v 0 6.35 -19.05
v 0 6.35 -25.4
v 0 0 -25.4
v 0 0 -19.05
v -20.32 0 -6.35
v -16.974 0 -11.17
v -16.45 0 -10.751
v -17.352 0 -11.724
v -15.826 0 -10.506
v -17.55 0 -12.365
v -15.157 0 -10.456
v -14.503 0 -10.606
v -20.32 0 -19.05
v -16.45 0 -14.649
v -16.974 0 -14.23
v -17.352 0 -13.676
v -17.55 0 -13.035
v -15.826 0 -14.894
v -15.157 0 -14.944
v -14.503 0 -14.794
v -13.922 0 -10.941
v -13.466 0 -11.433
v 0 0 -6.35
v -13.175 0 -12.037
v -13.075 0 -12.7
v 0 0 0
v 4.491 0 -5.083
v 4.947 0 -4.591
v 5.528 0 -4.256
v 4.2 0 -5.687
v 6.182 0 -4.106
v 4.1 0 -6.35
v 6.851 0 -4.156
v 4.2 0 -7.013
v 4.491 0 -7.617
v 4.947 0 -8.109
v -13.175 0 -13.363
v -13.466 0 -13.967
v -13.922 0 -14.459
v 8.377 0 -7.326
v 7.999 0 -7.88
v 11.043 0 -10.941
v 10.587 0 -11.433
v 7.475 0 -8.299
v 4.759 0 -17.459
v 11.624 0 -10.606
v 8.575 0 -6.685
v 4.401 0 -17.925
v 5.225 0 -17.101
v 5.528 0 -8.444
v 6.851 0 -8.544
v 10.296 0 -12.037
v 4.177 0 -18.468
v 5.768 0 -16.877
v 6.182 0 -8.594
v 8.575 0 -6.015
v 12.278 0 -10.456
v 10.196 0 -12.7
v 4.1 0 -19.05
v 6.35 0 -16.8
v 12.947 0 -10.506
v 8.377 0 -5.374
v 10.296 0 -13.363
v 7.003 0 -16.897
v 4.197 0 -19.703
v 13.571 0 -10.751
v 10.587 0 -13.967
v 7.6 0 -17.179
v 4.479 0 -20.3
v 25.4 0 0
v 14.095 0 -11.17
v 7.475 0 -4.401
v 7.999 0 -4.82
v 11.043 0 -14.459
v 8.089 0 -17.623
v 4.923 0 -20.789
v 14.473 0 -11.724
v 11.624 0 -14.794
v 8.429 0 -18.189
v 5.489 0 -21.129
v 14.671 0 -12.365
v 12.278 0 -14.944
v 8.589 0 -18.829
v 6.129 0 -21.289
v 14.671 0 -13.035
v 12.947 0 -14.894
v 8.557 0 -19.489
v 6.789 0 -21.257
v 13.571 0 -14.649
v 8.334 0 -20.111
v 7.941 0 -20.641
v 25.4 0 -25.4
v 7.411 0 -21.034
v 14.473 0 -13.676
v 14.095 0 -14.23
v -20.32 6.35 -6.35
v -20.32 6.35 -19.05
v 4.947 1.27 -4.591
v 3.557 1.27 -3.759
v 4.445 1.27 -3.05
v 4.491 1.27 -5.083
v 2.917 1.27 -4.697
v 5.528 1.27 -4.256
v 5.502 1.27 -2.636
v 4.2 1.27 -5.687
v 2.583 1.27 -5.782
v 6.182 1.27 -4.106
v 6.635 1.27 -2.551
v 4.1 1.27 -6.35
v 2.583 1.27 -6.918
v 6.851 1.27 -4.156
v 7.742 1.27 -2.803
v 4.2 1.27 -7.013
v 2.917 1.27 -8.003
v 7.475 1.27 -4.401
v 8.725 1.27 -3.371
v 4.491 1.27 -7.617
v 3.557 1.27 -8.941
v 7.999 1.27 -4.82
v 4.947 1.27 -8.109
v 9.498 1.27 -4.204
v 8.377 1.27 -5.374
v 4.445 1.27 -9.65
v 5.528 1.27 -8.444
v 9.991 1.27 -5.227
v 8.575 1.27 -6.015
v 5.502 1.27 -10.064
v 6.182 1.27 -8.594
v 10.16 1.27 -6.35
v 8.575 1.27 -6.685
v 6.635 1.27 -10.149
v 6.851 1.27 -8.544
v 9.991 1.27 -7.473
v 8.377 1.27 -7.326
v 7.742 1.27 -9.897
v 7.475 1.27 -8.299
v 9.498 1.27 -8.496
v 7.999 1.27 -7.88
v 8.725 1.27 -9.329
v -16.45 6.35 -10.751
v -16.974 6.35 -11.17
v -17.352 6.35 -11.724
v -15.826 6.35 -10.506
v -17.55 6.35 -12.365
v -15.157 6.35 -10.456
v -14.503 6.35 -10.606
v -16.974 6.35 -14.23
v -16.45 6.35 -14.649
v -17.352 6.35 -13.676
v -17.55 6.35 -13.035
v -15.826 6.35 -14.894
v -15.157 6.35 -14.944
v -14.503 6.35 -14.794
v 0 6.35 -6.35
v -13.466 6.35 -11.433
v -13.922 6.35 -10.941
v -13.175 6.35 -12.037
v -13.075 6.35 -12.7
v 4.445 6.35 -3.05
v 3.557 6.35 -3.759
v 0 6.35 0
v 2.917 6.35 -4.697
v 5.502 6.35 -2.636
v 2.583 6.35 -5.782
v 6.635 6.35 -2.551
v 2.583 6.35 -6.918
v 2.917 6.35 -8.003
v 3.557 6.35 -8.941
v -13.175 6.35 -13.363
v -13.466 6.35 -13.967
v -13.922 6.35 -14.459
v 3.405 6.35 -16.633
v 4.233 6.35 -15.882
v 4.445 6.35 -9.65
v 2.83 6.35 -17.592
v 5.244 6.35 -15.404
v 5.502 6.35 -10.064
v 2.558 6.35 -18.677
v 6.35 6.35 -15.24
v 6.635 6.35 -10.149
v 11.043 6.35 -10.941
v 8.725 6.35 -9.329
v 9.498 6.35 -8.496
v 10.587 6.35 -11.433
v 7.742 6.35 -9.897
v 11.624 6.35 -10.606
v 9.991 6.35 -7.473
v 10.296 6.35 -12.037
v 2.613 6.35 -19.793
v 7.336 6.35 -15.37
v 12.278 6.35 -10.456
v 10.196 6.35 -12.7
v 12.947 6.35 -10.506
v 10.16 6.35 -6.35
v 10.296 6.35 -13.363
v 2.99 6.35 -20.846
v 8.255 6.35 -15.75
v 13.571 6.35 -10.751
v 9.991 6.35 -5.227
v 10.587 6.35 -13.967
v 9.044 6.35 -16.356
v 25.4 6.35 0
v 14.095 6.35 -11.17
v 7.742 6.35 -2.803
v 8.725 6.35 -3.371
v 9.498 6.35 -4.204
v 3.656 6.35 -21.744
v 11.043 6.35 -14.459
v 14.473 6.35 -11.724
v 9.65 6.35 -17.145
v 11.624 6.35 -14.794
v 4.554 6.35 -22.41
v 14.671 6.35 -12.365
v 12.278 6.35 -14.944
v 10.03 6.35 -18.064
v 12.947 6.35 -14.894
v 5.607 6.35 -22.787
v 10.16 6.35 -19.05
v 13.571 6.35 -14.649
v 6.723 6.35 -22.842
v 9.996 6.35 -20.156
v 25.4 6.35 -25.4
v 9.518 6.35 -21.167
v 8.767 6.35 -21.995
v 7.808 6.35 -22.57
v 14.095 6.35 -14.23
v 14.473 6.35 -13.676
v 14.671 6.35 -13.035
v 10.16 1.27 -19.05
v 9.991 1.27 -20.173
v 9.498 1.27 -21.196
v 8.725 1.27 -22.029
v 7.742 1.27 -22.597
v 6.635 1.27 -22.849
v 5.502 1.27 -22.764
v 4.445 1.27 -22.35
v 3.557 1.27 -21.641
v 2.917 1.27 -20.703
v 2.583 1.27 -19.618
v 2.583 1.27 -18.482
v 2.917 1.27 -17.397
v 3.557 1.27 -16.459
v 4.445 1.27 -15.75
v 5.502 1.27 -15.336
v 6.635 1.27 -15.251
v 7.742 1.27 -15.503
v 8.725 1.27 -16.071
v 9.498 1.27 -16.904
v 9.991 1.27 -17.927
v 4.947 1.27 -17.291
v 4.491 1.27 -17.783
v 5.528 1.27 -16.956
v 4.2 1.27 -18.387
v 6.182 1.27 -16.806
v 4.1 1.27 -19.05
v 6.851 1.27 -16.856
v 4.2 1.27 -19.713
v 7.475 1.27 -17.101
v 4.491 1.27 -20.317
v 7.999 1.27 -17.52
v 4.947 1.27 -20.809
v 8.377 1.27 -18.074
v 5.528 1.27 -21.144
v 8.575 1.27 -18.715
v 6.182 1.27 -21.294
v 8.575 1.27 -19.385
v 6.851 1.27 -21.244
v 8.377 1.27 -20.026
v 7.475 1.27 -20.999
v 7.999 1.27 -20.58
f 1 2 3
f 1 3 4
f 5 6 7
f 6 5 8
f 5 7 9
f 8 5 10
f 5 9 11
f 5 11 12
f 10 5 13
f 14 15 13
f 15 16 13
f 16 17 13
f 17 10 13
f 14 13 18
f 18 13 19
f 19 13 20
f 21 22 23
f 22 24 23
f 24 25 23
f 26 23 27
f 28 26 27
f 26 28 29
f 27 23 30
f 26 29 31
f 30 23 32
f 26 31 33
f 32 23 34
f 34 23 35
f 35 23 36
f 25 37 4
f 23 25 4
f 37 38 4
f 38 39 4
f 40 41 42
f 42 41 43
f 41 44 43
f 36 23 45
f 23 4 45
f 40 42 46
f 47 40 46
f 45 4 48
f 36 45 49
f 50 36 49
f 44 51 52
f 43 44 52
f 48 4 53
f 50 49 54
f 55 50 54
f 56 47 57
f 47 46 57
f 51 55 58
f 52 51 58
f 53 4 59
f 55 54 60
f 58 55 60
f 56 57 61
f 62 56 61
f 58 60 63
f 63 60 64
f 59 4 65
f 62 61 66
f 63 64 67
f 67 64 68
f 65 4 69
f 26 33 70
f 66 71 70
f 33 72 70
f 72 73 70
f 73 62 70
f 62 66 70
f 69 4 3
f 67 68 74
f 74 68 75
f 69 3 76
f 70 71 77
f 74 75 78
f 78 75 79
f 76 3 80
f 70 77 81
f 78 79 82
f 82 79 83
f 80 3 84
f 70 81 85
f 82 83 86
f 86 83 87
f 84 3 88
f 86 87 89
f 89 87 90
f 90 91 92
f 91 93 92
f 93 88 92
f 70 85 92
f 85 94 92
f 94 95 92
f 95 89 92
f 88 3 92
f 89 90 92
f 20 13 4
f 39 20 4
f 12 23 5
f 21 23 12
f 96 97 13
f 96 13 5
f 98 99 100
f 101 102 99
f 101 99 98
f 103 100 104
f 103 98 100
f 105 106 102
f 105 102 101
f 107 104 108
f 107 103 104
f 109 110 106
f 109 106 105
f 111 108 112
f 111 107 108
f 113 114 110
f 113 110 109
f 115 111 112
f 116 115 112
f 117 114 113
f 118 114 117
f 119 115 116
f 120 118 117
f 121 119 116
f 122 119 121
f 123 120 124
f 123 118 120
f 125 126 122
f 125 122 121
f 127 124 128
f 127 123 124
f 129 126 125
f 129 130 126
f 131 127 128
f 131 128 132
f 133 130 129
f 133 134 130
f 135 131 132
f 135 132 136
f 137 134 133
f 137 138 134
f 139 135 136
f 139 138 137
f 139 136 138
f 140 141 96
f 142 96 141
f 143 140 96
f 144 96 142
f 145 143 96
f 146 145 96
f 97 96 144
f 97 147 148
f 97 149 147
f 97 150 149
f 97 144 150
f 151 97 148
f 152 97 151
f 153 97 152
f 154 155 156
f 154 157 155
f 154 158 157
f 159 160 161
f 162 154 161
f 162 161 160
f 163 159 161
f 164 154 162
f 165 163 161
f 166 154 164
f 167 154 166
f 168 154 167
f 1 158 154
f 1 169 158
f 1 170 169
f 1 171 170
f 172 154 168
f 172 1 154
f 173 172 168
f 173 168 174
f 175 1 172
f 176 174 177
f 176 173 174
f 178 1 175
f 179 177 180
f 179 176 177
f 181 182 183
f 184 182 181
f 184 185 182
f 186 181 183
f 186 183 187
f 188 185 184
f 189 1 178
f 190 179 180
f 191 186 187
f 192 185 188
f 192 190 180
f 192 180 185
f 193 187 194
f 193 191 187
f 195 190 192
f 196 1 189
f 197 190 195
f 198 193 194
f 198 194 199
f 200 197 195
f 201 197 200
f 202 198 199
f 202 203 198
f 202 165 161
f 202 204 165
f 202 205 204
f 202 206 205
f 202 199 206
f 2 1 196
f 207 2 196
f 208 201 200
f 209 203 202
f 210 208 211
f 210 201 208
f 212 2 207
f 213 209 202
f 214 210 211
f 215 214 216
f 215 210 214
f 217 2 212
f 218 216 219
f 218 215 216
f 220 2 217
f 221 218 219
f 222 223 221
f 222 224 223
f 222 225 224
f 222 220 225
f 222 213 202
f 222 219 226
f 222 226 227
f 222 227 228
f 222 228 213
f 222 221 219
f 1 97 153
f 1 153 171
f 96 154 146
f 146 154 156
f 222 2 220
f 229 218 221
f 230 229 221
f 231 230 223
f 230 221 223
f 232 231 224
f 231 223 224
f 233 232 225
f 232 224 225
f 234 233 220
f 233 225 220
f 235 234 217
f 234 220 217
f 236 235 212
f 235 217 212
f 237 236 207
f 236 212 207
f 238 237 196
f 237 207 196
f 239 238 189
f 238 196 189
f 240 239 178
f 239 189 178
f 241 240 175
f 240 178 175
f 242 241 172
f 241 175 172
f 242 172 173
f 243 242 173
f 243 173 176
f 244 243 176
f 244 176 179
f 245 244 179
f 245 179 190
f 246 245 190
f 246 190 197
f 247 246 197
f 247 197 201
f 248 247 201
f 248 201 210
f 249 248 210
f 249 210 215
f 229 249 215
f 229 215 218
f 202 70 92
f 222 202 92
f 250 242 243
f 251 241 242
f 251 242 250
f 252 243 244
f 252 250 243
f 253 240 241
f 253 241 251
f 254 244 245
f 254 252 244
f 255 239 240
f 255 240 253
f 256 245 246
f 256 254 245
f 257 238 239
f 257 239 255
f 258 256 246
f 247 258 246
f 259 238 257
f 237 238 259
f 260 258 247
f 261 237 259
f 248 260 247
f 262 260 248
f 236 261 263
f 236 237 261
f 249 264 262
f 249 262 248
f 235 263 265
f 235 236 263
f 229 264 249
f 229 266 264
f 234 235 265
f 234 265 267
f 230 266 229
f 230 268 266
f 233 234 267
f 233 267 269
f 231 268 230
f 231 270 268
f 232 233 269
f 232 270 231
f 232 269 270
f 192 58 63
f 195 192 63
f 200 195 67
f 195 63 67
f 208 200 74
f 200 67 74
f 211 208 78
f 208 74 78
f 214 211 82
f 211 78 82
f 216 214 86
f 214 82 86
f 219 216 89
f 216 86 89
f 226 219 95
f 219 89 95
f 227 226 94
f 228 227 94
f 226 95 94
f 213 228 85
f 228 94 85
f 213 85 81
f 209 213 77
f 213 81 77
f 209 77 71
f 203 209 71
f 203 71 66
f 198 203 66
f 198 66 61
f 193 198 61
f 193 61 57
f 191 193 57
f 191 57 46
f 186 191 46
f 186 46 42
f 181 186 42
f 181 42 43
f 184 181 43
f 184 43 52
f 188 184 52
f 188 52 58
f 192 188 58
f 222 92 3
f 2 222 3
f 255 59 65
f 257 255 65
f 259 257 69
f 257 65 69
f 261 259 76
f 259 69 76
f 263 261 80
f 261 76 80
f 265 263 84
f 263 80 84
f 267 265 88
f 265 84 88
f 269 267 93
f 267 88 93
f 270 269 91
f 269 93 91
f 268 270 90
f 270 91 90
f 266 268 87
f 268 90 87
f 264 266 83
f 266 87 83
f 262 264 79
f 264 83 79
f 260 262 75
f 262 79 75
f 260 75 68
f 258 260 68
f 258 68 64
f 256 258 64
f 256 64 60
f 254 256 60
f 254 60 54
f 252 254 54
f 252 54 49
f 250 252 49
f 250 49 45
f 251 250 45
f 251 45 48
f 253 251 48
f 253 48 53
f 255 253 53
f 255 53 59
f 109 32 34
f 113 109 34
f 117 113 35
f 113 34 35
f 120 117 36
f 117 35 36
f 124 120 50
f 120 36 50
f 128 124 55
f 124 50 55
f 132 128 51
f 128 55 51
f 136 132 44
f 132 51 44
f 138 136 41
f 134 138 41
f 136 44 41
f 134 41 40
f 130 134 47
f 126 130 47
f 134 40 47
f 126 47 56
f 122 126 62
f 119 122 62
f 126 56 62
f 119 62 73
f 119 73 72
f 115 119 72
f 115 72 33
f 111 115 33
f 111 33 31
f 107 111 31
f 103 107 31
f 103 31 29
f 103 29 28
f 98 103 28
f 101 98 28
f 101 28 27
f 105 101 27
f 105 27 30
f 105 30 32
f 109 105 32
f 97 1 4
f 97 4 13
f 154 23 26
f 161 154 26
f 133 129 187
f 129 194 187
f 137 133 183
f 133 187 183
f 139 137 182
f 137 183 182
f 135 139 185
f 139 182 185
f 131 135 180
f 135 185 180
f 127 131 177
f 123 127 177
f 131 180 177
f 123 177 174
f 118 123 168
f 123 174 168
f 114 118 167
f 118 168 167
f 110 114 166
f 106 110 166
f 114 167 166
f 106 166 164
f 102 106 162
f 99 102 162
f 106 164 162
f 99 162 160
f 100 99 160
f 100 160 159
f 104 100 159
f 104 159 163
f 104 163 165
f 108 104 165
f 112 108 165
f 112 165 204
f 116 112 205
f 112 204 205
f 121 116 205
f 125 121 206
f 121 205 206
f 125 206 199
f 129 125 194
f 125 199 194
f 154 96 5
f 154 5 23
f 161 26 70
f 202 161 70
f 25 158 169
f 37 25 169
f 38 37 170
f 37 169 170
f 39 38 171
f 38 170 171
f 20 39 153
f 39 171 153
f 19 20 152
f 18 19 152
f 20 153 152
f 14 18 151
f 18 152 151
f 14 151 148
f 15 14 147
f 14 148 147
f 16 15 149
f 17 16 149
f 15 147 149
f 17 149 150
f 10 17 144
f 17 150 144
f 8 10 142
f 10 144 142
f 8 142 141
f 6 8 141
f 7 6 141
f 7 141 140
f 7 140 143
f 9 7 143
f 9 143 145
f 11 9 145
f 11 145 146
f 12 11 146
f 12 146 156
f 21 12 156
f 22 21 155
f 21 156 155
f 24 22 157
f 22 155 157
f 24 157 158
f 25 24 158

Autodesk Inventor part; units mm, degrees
ref_plane "YZ Plane" through (0, 0, 0) normal (1, 0, 0) x (0, 1, 0)
ref_plane "XZ Plane" through (0, 0, 0) normal (0, 1, 0) x (-1, 0, 0)
ref_plane "XY Plane" through (0, 0, 0) normal (0, 0, 1) x (1, 0, 0)
sketch "Sketch1" plane through (0, 0, 0) normal (0, 1, 0) x (-1, 0, 0)
  line L0 (0, 0) -> (-25.4, 0)
  line L1 (-25.4, 0) -> (-25.4, -25.4)
  line L2 (-25.4, -25.4) -> (0, -25.4)
  line L3 (0, -25.4) -> (0, 0)
  line L4 (0, 0) -> (0, -6.35)
  line L5 (0, -6.35) -> (-6.35, -6.35)
  line L6 (-6.35, -6.35) -> (-6.35, -19.05)
  line L7 (0, -12.7) -> (-12.446, -12.7)
  circle A0 centre (-6.35, -6.35) radius 2.25
  circle A1 centre (-6.35, -19.05) radius 2.25
  circle A2 centre (-12.7, -12.7) radius 2.25
  circle A3 centre (-12.446, -12.7) radius 2.25
  dimension "d0" = 25.4
  dimension "d1" = 25.4
  dimension "d2" = 6.35
  dimension "d3" = 6.35
  dimension "d4" = 12.7
  dimension "d5" = 12.446
  dimension "d6" = 4.5
  dimension "d7" = 4.5
  dimension "d8" = 4.5
  dimension "d20" = 4.5
extrude "Extrusion1" add sketch "Sketch1" along normal blind 6.35 contours L3 L5 A0 L6 L7 L2 L1 L0 | L3 L7 L6 A0 L5 | A3 A2 picked at (-14.7705, -12.7)
sketch "Sketch2" plane through (0, 6.35, 0) normal (0, 1, 0) x (1, 0, 0)
  circle A0 centre (12.7, 12.7) radius 2.25 projected
  line L0 (0, 25.4) -> (0, 0) projected
  line L1 (0, 0) -> (25.4, 0) projected
  line L2 (25.4, 0) -> (25.4, 25.4) projected
  line L3 (25.4, 25.4) -> (0, 25.4) projected
  line L4 (0, 25.4) -> (0, 0) projected
  circle A1 centre (6.35, 19.05) radius 2.25 projected
  circle A2 centre (6.35, 6.35) radius 2.25 projected
  line L5 (12.7, 12.7) -> (-15.325, 12.7)
  circle A3 centre (-15.325, 12.7) radius 2.25
  line L6 (0, 19.05) -> (-20.32, 19.05)
  line L7 (-20.32, 19.05) -> (-20.32, 6.35)
  line L8 (-20.32, 6.35) -> (0, 6.35)
  line L9 (0, 6.35) -> (0, 19.05)
  point P0 (0, 6.35)
  dimension "d11" = 28.025
  dimension "d12" = 4.5
  dimension "d13" = 20.32
extrude "Extrusion2" add sketch "Sketch2" against normal blind 6.35 contours L0 L8 L7 L6
sketch "Sketch3" plane through (0, 6.35, 0) normal (0, 1, 0) x (1, 0, 0)
  circle A0 centre (12.7, 12.7) radius 2.25 projected
  circle A1 centre (6.35, 19.05) radius 2.25 projected
  circle A2 centre (6.35, 6.35) radius 2.25 projected
  circle A3 centre (6.35, 19.05) radius 3.81
  circle A4 centre (6.35, 6.35) radius 3.81
  point P0 (0, 0)
  dimension "d16" = 7.62
  dimension "d17" = 7.62
extrude "Extrusion3" cut sketch "Sketch3" against normal blind 5.08 contours A1 | A2 | A3 | A4
properties part number "DovetailSampleHolderToKB1X1TMagneticHolder"
